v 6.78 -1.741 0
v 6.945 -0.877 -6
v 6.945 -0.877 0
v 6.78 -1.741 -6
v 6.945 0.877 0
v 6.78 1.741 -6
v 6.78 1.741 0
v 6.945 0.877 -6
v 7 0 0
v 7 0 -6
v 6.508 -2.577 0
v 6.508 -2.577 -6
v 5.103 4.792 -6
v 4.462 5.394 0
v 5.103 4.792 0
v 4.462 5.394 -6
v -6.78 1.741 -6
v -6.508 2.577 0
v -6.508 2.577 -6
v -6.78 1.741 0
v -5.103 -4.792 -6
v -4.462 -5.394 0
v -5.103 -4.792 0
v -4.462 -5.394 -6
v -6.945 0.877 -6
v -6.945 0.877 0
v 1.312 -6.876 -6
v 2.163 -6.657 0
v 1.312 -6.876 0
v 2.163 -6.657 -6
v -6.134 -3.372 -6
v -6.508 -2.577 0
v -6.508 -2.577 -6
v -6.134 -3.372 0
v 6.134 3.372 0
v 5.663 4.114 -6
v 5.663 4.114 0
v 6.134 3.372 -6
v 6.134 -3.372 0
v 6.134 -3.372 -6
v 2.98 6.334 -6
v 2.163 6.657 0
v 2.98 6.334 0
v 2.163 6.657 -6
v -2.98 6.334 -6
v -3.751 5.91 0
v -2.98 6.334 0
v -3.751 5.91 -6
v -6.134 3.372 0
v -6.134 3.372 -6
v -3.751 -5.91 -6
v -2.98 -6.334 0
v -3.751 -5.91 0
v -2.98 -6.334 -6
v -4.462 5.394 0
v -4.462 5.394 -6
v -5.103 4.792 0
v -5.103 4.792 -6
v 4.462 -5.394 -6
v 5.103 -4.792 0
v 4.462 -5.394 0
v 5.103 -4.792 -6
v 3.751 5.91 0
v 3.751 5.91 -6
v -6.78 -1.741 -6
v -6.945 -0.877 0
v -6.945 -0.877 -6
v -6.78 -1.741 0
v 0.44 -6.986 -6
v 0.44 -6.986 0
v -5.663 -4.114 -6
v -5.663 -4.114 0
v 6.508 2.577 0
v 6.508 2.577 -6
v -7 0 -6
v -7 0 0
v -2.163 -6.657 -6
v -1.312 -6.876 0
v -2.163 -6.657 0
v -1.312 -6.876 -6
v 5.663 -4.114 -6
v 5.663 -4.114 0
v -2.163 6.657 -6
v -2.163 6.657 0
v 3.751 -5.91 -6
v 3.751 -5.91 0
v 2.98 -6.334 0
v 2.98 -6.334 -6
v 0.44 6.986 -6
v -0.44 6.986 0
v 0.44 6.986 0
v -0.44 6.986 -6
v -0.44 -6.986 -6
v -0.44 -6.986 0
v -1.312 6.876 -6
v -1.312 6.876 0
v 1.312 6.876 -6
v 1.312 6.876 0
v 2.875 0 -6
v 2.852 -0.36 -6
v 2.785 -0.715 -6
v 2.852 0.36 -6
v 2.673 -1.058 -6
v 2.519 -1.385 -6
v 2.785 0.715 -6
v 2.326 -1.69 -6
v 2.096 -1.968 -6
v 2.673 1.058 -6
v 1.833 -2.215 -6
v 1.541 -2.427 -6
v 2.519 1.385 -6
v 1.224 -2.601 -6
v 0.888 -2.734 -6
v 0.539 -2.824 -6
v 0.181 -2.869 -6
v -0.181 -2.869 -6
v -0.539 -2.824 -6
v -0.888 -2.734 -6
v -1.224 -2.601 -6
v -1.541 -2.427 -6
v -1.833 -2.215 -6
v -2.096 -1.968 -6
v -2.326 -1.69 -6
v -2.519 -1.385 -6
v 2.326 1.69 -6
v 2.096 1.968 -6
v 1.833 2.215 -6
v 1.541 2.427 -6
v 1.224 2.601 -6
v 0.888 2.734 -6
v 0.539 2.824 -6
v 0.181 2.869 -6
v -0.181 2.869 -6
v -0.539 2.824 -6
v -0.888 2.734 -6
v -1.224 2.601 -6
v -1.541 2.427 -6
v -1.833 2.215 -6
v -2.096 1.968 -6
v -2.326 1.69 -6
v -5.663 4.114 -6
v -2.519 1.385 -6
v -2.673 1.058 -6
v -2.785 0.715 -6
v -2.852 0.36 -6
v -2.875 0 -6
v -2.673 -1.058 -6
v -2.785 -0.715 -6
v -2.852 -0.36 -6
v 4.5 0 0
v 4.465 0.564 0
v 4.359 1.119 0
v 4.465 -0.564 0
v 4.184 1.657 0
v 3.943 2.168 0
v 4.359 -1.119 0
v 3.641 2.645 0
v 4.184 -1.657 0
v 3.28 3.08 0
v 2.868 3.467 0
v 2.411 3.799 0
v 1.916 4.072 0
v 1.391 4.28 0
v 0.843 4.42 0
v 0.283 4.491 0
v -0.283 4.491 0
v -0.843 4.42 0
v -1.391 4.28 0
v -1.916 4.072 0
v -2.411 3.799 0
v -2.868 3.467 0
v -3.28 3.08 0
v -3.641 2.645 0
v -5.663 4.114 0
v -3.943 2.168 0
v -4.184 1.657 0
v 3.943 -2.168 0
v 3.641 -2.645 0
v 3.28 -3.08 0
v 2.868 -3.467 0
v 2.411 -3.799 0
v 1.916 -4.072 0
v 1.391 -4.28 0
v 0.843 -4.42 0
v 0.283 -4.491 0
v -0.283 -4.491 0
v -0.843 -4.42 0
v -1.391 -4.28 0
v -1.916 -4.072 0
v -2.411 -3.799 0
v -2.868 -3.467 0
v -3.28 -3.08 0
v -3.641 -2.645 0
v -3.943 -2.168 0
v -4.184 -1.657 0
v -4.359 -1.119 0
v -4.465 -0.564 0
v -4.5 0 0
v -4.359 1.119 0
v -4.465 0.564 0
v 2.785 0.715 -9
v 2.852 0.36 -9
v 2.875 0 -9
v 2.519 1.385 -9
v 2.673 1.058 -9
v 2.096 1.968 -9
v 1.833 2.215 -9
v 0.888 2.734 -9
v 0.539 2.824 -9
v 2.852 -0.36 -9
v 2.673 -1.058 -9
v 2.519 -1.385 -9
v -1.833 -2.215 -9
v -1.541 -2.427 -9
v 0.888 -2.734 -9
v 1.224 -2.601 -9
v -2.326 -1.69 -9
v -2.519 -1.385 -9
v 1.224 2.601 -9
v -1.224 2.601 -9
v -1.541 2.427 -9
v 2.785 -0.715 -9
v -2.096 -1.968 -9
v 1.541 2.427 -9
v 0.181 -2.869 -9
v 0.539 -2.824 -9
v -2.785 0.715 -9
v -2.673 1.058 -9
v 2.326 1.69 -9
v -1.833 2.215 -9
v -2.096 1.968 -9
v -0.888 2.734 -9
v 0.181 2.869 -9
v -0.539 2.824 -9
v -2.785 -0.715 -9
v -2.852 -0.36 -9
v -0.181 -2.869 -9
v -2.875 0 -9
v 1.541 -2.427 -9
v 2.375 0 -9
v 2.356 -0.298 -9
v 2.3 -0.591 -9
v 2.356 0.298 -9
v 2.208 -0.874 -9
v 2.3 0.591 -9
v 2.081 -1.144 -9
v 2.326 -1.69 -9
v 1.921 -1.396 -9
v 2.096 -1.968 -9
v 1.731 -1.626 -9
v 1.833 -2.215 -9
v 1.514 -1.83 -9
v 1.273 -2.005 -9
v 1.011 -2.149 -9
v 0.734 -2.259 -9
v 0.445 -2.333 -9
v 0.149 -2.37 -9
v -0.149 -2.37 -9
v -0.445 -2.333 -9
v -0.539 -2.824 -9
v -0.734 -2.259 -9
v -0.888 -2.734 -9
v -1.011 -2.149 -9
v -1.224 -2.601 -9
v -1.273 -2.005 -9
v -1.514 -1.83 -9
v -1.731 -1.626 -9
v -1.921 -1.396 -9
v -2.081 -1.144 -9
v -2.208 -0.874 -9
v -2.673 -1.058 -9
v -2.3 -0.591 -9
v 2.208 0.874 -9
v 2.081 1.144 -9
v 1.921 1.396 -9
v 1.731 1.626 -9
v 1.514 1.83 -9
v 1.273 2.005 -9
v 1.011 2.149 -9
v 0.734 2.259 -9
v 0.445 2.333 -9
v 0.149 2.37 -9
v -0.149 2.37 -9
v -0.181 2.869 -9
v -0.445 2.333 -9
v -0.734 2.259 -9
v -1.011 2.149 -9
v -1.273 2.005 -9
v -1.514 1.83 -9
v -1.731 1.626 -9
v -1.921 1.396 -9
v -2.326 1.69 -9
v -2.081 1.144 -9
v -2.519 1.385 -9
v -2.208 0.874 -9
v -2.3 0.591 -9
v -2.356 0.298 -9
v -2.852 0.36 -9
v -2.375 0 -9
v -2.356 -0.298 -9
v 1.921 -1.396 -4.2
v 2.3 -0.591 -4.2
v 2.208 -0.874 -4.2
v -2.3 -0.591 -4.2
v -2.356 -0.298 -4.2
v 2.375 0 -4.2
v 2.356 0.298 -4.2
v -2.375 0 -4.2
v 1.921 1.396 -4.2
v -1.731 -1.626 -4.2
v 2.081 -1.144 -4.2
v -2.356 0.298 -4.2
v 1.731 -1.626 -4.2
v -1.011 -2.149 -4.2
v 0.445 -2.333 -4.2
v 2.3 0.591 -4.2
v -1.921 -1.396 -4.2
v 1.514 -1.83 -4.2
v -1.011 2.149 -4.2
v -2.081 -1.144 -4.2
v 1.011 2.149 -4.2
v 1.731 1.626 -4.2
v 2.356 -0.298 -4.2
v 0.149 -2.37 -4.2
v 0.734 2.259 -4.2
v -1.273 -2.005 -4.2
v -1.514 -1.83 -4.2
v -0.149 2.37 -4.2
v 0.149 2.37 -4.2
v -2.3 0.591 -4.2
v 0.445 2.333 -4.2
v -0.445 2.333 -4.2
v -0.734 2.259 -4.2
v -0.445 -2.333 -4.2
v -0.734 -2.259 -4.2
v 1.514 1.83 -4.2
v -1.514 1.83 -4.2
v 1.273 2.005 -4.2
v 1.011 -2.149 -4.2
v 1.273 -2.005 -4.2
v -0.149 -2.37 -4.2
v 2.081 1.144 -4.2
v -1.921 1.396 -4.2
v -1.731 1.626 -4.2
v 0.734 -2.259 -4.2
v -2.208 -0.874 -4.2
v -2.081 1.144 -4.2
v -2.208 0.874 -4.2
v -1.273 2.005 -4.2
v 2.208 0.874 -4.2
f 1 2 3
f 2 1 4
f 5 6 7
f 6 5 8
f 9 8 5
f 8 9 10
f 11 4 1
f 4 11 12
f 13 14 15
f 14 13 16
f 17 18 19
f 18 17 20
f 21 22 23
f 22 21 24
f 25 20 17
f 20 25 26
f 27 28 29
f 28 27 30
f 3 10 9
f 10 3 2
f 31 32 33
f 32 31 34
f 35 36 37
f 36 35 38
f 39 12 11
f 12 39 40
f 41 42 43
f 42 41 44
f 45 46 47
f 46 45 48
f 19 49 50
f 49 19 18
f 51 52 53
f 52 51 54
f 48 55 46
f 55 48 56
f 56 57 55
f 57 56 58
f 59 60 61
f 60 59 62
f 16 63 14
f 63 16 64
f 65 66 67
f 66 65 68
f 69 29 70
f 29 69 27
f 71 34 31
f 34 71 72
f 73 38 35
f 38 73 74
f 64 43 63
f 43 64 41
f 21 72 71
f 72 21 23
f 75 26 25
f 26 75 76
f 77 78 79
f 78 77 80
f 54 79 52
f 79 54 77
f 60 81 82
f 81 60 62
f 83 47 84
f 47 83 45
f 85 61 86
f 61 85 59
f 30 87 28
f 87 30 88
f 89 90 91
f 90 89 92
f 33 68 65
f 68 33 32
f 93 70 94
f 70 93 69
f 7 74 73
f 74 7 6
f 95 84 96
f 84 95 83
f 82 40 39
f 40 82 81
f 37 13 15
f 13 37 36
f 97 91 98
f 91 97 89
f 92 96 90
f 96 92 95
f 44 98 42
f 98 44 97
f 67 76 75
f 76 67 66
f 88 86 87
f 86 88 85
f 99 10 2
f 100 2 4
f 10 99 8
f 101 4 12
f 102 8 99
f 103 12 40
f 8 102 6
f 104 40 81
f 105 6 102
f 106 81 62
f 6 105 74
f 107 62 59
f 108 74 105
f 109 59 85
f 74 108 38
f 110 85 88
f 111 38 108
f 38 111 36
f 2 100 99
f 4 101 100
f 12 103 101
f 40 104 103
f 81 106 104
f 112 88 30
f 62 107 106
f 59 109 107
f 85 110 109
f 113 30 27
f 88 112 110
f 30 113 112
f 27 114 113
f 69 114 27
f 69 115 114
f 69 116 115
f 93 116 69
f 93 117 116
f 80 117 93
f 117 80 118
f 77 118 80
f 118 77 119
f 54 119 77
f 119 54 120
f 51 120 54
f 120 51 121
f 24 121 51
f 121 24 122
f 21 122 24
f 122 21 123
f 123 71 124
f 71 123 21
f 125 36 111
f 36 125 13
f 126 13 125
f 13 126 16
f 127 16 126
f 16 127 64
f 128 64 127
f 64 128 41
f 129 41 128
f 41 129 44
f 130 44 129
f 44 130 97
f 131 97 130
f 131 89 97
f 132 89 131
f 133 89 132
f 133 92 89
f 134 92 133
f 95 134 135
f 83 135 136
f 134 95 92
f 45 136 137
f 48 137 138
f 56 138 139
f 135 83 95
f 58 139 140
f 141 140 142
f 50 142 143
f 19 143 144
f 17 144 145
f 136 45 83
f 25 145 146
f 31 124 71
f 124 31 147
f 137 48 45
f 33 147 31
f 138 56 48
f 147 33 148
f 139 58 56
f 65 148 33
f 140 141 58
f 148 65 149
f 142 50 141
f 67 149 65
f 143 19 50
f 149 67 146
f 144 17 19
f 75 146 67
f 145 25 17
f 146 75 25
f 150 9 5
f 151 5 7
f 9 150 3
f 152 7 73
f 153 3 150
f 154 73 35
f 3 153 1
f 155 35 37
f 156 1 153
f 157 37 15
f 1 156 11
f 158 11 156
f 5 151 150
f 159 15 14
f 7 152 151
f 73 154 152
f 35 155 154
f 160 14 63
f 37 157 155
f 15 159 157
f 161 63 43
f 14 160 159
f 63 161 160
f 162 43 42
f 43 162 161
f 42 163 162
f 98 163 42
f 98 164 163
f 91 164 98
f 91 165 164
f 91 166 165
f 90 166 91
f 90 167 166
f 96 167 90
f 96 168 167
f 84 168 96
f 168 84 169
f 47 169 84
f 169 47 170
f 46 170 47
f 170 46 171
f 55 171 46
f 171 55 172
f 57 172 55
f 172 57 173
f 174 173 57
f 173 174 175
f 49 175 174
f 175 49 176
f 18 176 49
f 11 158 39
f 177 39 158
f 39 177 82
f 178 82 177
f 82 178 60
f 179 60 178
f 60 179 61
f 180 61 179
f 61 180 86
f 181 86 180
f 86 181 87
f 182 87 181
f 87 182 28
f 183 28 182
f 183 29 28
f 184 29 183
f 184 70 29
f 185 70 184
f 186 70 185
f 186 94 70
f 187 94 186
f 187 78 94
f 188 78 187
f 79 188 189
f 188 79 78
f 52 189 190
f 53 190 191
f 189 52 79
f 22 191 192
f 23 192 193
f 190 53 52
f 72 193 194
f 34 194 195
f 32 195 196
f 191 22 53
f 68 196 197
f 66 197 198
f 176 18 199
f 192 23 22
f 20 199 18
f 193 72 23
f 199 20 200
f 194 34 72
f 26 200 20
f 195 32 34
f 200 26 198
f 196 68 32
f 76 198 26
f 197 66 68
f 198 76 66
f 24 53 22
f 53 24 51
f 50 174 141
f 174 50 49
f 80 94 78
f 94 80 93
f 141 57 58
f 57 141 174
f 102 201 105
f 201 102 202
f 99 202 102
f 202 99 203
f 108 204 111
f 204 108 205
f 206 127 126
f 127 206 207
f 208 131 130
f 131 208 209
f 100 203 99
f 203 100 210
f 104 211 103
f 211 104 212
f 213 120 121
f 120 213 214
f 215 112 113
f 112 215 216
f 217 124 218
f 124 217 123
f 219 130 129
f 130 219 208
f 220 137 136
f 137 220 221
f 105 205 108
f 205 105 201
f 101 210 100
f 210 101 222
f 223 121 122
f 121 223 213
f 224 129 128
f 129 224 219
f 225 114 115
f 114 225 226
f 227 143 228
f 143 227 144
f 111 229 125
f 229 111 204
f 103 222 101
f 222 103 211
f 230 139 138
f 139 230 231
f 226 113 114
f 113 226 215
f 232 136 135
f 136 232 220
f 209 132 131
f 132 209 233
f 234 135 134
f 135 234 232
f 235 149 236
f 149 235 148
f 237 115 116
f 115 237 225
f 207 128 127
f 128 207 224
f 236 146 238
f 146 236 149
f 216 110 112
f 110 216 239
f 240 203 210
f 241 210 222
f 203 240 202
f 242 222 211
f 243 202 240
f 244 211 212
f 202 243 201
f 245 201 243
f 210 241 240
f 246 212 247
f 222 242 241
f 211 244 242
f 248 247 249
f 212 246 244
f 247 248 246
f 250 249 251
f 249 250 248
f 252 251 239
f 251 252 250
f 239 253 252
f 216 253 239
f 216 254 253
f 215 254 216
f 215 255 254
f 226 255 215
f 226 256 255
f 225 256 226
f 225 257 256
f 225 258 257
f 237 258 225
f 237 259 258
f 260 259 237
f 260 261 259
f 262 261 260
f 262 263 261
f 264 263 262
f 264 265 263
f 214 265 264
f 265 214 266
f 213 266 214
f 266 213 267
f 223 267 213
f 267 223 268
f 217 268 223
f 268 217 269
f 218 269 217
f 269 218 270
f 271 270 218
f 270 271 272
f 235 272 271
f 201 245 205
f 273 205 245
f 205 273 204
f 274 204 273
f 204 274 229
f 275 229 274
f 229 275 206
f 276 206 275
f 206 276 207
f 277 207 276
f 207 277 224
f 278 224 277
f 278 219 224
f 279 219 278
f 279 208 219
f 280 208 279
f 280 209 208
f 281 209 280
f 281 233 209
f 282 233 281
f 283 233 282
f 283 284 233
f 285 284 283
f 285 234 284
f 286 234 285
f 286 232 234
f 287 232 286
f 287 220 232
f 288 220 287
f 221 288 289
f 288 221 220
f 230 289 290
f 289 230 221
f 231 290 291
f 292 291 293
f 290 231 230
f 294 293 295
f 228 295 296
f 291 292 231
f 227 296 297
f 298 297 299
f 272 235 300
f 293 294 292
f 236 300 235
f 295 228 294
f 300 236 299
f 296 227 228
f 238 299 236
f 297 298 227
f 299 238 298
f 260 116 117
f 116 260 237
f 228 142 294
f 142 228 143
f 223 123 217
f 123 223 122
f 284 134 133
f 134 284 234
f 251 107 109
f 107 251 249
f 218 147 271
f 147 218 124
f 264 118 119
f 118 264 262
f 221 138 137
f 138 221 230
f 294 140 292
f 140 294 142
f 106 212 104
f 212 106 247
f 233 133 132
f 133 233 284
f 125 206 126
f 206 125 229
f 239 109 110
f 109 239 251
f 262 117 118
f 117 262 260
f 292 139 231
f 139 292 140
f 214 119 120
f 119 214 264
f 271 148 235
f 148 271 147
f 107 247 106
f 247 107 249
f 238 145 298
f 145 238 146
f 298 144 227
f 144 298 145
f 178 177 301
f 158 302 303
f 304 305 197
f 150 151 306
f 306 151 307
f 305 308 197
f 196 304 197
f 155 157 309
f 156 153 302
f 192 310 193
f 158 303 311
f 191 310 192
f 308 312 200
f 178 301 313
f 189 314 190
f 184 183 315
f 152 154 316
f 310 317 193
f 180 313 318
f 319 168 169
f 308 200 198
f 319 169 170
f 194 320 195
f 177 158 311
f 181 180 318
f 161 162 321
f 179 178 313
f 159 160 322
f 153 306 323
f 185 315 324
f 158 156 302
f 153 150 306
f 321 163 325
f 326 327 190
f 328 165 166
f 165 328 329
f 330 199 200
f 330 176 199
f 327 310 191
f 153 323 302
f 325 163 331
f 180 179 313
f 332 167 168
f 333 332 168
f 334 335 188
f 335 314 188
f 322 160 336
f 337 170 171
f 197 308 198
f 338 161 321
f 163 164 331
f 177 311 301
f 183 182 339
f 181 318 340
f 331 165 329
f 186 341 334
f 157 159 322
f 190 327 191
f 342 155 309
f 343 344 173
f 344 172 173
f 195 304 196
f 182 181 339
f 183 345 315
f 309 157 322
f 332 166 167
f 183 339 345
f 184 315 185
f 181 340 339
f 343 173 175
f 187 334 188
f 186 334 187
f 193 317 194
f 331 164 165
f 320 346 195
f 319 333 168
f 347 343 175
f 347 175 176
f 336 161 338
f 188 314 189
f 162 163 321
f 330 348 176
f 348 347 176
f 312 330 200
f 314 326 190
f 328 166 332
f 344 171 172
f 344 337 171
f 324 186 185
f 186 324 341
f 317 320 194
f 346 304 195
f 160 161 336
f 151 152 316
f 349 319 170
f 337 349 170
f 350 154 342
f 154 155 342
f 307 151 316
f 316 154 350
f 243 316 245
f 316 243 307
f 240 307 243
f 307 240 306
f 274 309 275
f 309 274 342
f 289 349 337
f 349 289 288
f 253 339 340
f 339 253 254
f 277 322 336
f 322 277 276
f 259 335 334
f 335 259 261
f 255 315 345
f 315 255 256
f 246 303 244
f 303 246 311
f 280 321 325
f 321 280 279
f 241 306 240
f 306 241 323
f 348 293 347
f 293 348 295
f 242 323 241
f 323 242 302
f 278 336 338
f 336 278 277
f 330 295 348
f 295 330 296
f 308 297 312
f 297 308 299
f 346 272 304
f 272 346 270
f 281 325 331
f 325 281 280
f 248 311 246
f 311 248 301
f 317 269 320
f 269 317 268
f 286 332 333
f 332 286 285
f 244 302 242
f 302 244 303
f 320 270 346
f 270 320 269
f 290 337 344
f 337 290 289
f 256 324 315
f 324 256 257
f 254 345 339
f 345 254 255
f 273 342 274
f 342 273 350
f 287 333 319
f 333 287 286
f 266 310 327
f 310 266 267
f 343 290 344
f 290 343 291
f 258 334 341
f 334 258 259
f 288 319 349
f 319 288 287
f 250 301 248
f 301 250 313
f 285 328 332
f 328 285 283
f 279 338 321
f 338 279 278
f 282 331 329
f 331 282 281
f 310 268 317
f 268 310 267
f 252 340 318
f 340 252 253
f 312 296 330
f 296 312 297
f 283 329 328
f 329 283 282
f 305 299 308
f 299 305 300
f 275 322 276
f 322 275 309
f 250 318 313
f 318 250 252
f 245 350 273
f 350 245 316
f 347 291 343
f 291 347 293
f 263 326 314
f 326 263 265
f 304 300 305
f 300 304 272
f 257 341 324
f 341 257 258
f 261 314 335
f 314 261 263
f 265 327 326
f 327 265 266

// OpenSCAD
$fn = 50;

difference() {
	union() {
		translate(v = [0, 0, -6.0]) {
			cylinder(h = 6, r = 7.0);
		}
		#translate(v = [0, 0, -9.0]) {
			cylinder(h = 9, r = 2.875);
		}
	}
	union() {
		translate(v = [0, 0, 0]) {
			rotate(a = [0, 0, 0]) {
				difference() {
					union() {
						translate(v = [0, 0, -9.0]) {
							cylinder(h = 9, r = 2.25);
						}
						translate(v = [0, 0, -4.2]) {
							cylinder(h = 4.2, r1 = 2.375, r2 = 4.5);
						}
						translate(v = [0, 0, -9.0]) {
							cylinder(h = 9, r = 2.375);
						}
						translate(v = [0, 0, -9.0]) {
							cylinder(h = 9, r = 2.25);
						}
					}
					union();
				}
			}
		}
	}
}
